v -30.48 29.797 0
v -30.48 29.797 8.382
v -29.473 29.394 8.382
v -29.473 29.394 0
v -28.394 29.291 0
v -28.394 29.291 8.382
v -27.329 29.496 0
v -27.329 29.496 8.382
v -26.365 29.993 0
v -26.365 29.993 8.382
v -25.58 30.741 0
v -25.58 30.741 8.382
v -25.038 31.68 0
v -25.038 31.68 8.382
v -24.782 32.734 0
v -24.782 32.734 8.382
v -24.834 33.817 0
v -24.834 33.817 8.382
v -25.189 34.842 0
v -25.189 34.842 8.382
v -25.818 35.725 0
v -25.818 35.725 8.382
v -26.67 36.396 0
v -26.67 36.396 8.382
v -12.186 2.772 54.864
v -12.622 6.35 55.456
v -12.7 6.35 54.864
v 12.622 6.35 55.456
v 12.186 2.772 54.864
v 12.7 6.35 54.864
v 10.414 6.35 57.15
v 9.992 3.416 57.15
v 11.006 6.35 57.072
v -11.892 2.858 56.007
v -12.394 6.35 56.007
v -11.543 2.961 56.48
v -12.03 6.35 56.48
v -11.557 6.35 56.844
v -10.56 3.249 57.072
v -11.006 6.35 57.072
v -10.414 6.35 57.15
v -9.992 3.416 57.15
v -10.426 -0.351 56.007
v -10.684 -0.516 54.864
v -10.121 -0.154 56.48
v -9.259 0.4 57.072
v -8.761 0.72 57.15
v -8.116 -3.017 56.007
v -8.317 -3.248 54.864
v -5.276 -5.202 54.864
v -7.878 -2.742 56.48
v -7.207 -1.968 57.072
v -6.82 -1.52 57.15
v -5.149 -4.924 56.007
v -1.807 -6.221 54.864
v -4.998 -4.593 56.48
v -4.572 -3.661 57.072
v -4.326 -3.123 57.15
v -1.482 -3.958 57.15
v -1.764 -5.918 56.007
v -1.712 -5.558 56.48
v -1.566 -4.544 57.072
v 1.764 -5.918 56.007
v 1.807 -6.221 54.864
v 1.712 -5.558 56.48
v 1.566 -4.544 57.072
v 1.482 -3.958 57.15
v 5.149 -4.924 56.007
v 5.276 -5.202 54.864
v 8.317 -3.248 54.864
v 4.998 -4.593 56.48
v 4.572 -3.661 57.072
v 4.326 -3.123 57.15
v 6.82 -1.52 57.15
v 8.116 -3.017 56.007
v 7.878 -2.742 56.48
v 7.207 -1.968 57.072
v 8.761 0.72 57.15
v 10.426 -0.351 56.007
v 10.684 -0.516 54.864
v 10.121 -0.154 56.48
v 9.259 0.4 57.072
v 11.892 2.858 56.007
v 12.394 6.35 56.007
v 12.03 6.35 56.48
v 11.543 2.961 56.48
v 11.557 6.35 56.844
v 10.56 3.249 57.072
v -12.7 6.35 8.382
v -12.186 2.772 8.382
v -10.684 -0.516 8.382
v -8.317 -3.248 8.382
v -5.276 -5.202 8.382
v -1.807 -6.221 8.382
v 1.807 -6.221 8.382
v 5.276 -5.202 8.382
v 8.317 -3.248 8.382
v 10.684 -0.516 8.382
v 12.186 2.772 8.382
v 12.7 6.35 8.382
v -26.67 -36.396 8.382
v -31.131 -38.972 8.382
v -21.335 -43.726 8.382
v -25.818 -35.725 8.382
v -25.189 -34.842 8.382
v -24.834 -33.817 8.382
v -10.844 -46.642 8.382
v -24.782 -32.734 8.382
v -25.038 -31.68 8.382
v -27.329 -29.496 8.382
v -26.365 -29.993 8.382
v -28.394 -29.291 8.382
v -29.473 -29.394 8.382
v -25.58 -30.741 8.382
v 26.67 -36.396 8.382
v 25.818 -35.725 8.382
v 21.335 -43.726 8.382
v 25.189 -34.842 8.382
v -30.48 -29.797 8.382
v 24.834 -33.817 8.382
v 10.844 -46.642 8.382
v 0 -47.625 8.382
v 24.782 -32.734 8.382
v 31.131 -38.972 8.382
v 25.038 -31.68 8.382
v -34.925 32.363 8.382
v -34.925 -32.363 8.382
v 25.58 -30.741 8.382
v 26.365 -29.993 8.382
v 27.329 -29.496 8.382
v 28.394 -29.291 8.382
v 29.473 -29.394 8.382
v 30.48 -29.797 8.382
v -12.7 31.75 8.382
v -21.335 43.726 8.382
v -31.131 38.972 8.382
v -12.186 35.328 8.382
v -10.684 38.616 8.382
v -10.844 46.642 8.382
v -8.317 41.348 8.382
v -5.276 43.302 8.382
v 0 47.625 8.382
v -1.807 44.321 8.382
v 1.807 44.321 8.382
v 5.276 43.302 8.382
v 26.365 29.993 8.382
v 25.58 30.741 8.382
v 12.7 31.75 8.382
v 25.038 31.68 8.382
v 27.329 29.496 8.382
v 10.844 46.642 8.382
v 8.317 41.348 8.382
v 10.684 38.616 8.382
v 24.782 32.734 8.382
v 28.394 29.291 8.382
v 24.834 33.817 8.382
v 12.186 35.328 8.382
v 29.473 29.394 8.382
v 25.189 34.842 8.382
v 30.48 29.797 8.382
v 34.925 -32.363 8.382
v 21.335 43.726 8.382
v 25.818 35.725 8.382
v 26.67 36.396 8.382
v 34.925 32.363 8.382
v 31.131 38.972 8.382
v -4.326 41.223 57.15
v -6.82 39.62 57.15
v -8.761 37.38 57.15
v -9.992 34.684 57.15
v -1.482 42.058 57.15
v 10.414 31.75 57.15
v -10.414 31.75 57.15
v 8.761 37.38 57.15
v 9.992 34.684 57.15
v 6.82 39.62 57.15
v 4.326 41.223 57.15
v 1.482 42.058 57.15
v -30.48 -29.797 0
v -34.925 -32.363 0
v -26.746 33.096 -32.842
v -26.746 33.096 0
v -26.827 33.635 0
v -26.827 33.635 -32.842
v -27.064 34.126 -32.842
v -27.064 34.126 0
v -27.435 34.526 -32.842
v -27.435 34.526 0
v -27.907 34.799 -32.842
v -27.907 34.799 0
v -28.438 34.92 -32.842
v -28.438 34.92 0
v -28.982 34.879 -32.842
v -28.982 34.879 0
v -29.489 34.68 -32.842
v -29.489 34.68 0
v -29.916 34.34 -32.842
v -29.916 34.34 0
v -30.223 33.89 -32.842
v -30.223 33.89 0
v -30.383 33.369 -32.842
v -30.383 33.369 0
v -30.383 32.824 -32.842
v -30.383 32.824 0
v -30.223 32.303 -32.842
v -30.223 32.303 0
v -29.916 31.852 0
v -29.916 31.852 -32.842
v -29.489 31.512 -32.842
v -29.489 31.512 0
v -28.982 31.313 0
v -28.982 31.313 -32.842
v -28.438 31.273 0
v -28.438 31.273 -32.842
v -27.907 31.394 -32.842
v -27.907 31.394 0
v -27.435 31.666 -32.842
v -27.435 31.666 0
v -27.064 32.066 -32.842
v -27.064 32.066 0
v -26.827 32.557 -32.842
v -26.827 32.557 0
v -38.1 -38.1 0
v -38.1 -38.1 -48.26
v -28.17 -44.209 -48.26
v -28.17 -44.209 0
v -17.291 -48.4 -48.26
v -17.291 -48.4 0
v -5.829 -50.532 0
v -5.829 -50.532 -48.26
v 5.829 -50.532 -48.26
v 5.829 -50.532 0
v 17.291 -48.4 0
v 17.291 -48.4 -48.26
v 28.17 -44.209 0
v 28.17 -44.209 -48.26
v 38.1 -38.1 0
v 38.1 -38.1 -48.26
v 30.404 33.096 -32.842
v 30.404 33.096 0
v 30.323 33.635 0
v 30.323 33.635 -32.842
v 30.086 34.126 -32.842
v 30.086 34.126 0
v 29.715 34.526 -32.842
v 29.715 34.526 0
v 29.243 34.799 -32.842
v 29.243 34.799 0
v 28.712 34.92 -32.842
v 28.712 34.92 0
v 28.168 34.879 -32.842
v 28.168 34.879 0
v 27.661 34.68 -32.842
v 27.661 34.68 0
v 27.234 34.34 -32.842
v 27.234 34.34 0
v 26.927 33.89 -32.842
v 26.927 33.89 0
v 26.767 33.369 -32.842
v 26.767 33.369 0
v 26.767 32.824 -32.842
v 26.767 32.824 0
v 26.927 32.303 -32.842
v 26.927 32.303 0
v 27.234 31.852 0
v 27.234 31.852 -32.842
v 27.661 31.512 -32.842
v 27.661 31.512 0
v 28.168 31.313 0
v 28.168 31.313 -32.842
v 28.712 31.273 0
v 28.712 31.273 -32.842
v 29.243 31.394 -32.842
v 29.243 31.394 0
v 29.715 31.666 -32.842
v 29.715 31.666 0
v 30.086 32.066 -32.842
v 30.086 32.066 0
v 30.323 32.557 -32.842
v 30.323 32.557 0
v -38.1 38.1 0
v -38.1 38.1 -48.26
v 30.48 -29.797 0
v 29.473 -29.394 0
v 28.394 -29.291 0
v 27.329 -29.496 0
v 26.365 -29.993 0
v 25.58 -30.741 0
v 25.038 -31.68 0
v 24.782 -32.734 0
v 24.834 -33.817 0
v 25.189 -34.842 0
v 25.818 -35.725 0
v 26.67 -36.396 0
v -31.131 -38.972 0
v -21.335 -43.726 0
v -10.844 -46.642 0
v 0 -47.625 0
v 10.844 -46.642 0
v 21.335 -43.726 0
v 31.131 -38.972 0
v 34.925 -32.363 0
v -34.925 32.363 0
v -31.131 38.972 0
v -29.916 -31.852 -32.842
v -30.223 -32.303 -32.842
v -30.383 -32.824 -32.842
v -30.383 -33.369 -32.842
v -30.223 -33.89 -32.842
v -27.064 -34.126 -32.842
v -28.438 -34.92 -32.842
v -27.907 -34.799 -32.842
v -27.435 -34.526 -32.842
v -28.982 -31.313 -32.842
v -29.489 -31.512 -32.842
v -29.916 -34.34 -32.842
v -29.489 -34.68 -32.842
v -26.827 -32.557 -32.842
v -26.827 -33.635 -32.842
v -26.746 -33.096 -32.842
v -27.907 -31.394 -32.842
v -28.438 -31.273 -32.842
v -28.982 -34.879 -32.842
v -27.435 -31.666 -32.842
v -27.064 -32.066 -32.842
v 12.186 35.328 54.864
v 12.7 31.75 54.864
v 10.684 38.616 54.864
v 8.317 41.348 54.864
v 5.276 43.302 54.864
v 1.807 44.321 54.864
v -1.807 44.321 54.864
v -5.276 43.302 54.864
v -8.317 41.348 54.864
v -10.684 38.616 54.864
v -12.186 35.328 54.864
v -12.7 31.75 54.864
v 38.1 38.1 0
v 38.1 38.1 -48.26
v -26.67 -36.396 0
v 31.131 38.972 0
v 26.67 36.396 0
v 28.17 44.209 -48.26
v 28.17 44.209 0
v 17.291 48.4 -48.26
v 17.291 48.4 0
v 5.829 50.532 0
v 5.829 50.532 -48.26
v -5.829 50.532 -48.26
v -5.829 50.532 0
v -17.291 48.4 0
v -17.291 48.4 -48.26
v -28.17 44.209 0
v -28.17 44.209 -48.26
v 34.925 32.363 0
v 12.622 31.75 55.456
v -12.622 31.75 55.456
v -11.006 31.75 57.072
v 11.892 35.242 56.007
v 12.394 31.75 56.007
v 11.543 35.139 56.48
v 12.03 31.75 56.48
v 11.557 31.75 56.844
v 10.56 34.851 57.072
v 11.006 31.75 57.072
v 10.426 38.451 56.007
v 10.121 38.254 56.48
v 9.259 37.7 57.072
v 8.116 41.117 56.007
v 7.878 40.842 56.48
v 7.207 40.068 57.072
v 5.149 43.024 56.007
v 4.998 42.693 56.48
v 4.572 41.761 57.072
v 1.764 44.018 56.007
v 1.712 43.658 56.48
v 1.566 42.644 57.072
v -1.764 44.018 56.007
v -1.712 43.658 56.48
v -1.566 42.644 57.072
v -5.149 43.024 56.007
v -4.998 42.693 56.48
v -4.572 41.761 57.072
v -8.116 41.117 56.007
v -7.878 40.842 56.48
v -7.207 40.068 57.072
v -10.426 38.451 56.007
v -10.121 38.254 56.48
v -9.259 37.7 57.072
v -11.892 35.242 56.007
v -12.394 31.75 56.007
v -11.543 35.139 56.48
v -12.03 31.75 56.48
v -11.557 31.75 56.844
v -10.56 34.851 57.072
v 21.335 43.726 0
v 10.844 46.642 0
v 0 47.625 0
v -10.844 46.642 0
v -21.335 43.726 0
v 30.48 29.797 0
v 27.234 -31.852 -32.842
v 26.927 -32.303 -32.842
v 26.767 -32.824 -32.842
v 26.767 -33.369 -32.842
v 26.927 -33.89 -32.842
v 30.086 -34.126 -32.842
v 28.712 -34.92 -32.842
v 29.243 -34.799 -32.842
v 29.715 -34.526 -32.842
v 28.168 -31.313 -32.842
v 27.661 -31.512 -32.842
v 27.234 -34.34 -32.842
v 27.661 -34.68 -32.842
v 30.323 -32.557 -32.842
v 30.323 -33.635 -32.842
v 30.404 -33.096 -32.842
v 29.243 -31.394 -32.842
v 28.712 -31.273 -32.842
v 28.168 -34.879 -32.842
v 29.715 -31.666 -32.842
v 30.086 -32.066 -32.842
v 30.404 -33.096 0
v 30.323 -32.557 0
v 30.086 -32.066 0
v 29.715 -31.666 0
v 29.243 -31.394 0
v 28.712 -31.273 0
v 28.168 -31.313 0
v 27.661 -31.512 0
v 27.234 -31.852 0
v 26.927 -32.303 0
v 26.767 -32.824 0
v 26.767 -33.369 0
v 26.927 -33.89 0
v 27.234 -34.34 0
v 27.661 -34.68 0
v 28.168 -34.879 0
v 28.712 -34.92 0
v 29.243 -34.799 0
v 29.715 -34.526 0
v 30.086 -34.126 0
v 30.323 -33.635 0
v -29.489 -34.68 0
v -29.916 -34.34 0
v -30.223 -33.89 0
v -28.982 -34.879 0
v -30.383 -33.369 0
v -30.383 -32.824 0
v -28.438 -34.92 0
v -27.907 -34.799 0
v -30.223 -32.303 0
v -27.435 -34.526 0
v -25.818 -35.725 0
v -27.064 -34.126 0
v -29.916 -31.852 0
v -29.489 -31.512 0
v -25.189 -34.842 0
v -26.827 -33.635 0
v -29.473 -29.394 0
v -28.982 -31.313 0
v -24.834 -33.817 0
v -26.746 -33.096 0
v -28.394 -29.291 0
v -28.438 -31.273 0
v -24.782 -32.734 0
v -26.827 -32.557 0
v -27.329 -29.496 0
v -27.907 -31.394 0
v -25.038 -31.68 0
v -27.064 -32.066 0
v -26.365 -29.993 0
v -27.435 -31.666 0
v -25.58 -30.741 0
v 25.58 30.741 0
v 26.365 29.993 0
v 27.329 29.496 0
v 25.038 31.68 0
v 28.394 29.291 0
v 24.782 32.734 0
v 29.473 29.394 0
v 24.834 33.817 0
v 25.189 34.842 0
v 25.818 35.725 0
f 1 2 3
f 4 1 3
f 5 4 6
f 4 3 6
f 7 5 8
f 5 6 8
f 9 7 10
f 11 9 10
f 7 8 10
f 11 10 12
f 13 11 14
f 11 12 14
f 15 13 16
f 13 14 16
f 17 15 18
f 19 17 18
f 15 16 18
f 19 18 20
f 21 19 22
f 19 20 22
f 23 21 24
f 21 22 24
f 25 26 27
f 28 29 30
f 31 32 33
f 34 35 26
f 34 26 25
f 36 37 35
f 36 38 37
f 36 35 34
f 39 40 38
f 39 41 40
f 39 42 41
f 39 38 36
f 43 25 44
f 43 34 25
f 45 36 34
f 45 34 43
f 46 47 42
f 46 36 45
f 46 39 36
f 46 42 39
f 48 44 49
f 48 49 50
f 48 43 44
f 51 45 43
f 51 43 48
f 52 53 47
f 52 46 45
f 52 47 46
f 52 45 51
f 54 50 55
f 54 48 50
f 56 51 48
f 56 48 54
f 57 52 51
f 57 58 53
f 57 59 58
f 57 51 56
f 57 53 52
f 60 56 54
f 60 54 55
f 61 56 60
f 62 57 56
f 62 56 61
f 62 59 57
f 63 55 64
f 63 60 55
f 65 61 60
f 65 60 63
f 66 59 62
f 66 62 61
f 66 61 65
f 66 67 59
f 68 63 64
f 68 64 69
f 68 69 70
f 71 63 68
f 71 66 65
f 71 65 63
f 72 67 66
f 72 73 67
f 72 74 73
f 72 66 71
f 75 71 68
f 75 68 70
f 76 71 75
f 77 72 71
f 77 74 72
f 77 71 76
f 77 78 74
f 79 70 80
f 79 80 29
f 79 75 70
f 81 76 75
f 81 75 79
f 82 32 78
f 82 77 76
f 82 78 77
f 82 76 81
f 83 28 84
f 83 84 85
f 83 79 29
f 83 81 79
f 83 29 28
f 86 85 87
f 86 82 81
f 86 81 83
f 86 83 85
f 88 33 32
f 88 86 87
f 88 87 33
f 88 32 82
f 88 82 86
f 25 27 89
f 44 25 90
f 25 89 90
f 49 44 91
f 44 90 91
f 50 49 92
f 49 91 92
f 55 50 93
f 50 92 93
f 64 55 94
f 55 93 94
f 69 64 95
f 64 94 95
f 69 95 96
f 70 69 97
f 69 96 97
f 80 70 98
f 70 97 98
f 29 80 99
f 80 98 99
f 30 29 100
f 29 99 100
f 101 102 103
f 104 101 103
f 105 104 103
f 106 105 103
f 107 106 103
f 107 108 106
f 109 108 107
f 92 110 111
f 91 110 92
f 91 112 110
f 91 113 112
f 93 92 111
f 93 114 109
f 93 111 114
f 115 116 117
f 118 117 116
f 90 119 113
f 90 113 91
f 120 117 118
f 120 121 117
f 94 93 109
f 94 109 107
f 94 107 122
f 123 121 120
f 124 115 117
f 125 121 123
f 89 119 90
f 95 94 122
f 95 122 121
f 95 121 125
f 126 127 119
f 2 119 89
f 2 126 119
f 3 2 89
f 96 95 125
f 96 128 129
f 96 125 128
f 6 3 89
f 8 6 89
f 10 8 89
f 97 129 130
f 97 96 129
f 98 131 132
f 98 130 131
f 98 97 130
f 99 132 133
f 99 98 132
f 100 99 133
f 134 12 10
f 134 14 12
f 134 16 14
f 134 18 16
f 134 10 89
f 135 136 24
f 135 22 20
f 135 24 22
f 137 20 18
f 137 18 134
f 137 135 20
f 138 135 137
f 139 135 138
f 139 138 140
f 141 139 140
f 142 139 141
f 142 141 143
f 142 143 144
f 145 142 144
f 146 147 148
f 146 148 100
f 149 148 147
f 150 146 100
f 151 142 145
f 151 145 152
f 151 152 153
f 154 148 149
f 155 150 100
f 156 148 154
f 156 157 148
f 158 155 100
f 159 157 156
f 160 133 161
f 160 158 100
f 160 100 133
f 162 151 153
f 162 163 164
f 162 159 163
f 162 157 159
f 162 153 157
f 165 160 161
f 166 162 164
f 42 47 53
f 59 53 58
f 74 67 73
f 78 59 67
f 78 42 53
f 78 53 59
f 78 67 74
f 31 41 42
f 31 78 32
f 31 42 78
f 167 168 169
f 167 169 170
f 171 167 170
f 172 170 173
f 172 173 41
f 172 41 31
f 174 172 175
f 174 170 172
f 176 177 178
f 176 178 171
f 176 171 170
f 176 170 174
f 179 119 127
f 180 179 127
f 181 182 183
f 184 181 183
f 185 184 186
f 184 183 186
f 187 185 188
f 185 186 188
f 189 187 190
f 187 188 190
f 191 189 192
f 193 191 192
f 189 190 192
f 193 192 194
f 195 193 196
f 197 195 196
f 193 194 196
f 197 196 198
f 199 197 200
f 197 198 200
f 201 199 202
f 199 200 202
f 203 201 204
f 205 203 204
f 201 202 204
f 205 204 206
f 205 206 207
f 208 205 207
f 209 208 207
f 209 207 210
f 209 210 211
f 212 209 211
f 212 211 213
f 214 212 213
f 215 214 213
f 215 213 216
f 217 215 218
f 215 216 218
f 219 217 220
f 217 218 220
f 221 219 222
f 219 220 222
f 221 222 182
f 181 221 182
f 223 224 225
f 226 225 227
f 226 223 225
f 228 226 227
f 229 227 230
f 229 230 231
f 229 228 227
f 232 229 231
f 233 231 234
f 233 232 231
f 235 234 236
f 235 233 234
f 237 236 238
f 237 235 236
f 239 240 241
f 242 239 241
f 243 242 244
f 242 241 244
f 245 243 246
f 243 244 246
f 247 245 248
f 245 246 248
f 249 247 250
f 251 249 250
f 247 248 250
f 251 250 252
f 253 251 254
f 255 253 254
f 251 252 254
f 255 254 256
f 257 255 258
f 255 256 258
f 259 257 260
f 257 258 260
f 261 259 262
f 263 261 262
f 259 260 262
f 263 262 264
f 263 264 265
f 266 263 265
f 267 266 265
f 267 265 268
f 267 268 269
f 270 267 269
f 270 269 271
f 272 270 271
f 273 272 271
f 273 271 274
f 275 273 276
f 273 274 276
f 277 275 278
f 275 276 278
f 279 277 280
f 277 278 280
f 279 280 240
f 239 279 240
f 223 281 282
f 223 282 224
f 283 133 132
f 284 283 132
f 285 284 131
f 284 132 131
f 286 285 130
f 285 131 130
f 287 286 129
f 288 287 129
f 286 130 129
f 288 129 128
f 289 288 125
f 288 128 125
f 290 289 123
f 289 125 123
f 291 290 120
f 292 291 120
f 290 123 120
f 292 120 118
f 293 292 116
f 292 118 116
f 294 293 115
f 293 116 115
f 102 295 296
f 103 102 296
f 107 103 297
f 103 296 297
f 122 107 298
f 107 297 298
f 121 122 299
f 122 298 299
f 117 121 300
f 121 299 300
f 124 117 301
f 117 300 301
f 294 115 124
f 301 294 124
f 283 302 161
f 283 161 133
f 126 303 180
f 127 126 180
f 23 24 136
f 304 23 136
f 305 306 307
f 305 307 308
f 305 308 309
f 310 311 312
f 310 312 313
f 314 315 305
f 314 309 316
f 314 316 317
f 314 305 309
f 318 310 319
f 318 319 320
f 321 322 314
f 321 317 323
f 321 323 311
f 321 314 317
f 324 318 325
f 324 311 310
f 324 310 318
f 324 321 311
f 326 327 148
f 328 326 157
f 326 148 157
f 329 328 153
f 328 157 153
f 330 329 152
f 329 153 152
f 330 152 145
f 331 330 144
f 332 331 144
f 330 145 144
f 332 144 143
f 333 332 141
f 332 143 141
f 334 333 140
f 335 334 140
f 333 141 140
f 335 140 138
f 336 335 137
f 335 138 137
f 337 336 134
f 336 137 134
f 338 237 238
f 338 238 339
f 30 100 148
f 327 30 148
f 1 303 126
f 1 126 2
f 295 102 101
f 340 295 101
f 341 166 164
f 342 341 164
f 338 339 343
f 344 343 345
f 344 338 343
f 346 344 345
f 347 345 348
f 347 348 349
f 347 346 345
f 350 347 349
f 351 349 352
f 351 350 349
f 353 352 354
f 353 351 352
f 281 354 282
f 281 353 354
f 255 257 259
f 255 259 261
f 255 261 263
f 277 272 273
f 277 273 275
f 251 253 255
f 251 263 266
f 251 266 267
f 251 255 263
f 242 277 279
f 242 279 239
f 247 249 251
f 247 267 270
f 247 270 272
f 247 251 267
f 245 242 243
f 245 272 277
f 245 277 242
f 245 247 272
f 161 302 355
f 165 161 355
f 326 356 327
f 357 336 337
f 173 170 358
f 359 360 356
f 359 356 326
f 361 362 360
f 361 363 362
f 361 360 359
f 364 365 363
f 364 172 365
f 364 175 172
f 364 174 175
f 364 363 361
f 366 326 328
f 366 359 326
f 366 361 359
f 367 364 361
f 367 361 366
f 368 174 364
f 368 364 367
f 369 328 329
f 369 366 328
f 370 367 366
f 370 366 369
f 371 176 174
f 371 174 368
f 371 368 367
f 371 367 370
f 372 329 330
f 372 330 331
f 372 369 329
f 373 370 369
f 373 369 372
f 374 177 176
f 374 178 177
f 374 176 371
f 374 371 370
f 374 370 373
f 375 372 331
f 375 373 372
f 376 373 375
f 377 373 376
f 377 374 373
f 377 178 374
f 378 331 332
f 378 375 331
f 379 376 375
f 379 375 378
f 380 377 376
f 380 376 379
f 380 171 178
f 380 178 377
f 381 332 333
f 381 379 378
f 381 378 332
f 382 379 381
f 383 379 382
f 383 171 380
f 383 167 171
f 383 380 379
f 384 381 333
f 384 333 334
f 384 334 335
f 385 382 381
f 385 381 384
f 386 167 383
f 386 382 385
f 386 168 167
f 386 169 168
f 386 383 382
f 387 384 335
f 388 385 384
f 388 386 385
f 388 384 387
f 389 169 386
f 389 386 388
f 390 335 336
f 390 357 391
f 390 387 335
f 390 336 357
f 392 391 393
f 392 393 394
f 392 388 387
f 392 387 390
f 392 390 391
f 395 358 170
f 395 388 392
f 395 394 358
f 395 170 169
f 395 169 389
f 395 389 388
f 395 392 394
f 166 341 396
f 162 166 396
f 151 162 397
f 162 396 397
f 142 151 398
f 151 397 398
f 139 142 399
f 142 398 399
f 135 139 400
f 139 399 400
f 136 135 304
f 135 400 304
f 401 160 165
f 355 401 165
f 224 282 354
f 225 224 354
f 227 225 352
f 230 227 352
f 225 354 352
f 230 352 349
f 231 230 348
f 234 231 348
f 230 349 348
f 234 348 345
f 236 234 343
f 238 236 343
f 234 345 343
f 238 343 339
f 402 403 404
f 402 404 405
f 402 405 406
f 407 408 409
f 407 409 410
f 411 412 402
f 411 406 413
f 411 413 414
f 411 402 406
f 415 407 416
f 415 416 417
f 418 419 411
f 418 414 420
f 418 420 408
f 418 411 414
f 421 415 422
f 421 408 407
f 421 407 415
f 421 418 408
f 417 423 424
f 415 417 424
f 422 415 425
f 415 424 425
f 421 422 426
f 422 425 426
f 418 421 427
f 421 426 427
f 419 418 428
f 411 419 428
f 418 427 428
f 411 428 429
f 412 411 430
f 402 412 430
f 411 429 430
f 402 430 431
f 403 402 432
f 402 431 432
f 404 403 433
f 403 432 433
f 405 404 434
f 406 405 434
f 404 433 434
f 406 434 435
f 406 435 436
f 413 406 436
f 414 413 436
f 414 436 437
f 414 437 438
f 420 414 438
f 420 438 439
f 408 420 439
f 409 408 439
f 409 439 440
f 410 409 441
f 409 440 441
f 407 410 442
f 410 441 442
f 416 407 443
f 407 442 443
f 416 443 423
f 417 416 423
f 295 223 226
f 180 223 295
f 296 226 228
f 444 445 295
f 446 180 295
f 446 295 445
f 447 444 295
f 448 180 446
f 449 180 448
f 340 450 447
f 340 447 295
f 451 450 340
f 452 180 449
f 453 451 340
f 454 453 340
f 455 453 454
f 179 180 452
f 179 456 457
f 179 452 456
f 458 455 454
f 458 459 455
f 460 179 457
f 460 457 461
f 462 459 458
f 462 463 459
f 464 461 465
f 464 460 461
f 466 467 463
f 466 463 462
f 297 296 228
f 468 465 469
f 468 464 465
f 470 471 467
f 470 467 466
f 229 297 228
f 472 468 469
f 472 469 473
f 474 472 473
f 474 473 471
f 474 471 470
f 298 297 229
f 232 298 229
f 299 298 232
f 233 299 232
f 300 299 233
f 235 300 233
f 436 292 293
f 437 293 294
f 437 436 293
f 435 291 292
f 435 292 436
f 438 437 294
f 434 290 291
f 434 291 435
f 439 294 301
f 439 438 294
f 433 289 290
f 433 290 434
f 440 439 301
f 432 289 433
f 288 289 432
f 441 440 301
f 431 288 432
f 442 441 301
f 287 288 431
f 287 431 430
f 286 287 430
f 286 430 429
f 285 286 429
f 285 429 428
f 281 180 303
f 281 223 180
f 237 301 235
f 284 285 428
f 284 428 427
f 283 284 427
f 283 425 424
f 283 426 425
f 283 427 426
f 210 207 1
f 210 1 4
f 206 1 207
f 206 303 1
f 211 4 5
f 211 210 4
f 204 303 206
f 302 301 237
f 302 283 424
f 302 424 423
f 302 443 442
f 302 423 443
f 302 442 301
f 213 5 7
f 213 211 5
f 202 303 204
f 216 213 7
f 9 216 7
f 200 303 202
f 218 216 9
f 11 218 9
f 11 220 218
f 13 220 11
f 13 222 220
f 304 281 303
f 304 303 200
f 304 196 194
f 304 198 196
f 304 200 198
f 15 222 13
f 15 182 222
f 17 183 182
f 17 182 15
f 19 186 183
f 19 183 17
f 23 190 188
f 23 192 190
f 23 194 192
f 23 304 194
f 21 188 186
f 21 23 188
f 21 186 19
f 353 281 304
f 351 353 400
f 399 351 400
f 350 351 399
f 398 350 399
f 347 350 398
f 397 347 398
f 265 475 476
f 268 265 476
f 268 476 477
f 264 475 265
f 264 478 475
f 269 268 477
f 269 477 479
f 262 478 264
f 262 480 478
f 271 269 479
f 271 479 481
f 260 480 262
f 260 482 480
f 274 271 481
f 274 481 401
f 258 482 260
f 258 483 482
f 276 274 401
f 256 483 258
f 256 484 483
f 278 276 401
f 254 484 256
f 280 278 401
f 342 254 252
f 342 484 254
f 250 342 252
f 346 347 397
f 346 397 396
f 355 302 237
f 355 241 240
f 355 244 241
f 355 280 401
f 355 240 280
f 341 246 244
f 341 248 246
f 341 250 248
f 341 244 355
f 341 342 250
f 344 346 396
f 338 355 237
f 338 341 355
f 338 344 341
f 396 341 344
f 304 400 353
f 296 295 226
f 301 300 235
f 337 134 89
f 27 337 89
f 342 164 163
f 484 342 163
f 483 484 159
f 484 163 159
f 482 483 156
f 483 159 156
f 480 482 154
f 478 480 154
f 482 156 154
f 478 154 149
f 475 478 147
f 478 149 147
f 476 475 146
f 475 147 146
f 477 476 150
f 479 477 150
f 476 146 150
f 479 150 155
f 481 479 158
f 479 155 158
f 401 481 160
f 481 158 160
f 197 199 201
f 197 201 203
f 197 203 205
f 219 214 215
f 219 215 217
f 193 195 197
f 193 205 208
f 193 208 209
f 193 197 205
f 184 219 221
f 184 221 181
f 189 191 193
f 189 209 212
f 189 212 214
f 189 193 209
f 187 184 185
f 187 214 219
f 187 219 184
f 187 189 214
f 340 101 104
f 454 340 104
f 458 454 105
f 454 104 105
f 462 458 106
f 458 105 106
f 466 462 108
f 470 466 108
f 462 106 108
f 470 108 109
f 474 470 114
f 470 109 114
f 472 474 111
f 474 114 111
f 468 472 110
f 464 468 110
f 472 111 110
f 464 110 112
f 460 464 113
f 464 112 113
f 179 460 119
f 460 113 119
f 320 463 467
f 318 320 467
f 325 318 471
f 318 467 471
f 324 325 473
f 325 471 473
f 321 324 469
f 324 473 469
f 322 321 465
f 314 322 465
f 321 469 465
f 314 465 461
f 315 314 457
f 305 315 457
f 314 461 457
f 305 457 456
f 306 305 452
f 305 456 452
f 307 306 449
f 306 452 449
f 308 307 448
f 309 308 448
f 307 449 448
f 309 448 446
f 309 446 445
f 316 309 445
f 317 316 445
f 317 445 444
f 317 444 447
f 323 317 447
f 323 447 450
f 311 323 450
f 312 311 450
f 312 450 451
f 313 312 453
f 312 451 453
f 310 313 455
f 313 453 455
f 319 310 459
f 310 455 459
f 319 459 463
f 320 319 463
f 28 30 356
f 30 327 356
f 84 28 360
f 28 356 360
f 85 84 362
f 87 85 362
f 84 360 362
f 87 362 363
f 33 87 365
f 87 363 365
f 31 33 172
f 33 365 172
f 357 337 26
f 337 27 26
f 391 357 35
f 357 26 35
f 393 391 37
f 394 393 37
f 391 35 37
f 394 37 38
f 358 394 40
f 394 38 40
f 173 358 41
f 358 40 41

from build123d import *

# Parameters (mm, degrees)
F1_DEPTH = 48.26
F3_DEPTH = 8.382
F5_DEPTH = 8.382
F6_R     = 1.8288
F7_DEPTH = 32.8422
F9_DEPTH = 57.15
F10_R    = 2.286


with BuildPart() as f1:
    # F0 (on Top) → F1 (new body)
    with BuildSketch(Plane.XY):
        with BuildLine():
            Line((-38.1, 38.1), (-38.1, -38.1))
            ThreePointArc((-38.1, -38.1), (0, -50.8), (38.1, -38.1))
            Line((38.1, -38.1), (38.1, 38.1))
            ThreePointArc((38.1, 38.1), (0, 50.8), (-38.1, 38.1))
        make_face()
    extrude(amount=-F1_DEPTH)

    # F2 (on face) → F3 (join)
    with BuildSketch(Plane.XY):
        with BuildLine():
            ThreePointArc((34.925, 36.486888), (0, 47.625), (-34.925, 36.486888))
            Line((-34.925, 36.486888), (-34.925, -36.486888))
            ThreePointArc((-34.925, -36.486888), (0, -47.625), (34.925, -36.486888))
            Line((34.925, -36.486888), (34.925, 36.486888))
        make_face()
    extrude(amount=F3_DEPTH)

    # F4 (on face) → F5 (cut, through all)
    with BuildSketch(Plane.XY.offset(8.382)):
        with BuildLine():
            ThreePointArc((-26.67, -36.395757), (-25.275443, -31.1912), (-30.48, -29.796643))
            Line((-30.48, -29.796643), (-52.477045, -42.496643))
            ThreePointArc((-52.477045, -42.496643), (-53.871602, -47.7012), (-48.667045, -49.095757))
            Line((-48.667045, -49.095757), (-26.67, -36.395757))
        make_face()
        with BuildLine():
            Line((52.477045, -42.496643), (30.48, -29.796643))
            ThreePointArc((30.48, -29.796643), (25.275443, -31.1912), (26.67, -36.395757))
            Line((26.67, -36.395757), (48.667045, -49.095757))
            ThreePointArc((48.667045, -49.095757), (53.871602, -47.7012), (52.477045, -42.496643))
        make_face()
        with BuildLine():
            Line((-52.477045, 42.496643), (-30.48, 29.796643))
            ThreePointArc((-30.48, 29.796643), (-25.275443, 31.1912), (-26.67, 36.395757))
            Line((-26.67, 36.395757), (-48.667045, 49.095757))
            ThreePointArc((-48.667045, 49.095757), (-53.871602, 47.7012), (-52.477045, 42.496643))
        make_face()
        with BuildLine():
            ThreePointArc((26.67, 36.395757), (25.275443, 31.1912), (30.48, 29.796643))
            Line((30.48, 29.796643), (52.477045, 42.496643))
            ThreePointArc((52.477045, 42.496643), (53.871602, 47.7012), (48.667045, 49.095757))
            Line((48.667045, 49.095757), (26.67, 36.395757))
        make_face()
    extrude(amount=-F5_DEPTH, mode=Mode.SUBTRACT)

    # F6 (on face) → F7 (cut)
    with BuildSketch(Plane.XY):
        with Locations((28.575, -33.0962)):
            Circle(F6_R)
        with Locations((-28.575, -33.0962)):
            Circle(F6_R)
        with Locations((28.575, 33.0962)):
            Circle(F6_R)
        with Locations((-28.575, 33.0962)):
            Circle(F6_R)
    extrude(amount=-F7_DEPTH, mode=Mode.SUBTRACT)

    # F8 (on Top) → F9 (join)
    with BuildSketch(Plane.XY):
        with BuildLine():
            ThreePointArc((-12.7, 6.35), (0, -6.35), (12.7, 6.35))
            Line((12.7, 6.35), (12.7, 31.75))
            ThreePointArc((12.7, 31.75), (0, 44.45), (-12.7, 31.75))
            Line((-12.7, 31.75), (-12.7, 6.35))
        make_face()
    extrude(amount=F9_DEPTH)

    # F10
    f10_edges = [f1.edges().sort_by_distance(p)[0] for p in [
        (12.7, 19.05, 57.15),
    ]]
    fillet(f10_edges, radius=F10_R)


solid = f1.part
